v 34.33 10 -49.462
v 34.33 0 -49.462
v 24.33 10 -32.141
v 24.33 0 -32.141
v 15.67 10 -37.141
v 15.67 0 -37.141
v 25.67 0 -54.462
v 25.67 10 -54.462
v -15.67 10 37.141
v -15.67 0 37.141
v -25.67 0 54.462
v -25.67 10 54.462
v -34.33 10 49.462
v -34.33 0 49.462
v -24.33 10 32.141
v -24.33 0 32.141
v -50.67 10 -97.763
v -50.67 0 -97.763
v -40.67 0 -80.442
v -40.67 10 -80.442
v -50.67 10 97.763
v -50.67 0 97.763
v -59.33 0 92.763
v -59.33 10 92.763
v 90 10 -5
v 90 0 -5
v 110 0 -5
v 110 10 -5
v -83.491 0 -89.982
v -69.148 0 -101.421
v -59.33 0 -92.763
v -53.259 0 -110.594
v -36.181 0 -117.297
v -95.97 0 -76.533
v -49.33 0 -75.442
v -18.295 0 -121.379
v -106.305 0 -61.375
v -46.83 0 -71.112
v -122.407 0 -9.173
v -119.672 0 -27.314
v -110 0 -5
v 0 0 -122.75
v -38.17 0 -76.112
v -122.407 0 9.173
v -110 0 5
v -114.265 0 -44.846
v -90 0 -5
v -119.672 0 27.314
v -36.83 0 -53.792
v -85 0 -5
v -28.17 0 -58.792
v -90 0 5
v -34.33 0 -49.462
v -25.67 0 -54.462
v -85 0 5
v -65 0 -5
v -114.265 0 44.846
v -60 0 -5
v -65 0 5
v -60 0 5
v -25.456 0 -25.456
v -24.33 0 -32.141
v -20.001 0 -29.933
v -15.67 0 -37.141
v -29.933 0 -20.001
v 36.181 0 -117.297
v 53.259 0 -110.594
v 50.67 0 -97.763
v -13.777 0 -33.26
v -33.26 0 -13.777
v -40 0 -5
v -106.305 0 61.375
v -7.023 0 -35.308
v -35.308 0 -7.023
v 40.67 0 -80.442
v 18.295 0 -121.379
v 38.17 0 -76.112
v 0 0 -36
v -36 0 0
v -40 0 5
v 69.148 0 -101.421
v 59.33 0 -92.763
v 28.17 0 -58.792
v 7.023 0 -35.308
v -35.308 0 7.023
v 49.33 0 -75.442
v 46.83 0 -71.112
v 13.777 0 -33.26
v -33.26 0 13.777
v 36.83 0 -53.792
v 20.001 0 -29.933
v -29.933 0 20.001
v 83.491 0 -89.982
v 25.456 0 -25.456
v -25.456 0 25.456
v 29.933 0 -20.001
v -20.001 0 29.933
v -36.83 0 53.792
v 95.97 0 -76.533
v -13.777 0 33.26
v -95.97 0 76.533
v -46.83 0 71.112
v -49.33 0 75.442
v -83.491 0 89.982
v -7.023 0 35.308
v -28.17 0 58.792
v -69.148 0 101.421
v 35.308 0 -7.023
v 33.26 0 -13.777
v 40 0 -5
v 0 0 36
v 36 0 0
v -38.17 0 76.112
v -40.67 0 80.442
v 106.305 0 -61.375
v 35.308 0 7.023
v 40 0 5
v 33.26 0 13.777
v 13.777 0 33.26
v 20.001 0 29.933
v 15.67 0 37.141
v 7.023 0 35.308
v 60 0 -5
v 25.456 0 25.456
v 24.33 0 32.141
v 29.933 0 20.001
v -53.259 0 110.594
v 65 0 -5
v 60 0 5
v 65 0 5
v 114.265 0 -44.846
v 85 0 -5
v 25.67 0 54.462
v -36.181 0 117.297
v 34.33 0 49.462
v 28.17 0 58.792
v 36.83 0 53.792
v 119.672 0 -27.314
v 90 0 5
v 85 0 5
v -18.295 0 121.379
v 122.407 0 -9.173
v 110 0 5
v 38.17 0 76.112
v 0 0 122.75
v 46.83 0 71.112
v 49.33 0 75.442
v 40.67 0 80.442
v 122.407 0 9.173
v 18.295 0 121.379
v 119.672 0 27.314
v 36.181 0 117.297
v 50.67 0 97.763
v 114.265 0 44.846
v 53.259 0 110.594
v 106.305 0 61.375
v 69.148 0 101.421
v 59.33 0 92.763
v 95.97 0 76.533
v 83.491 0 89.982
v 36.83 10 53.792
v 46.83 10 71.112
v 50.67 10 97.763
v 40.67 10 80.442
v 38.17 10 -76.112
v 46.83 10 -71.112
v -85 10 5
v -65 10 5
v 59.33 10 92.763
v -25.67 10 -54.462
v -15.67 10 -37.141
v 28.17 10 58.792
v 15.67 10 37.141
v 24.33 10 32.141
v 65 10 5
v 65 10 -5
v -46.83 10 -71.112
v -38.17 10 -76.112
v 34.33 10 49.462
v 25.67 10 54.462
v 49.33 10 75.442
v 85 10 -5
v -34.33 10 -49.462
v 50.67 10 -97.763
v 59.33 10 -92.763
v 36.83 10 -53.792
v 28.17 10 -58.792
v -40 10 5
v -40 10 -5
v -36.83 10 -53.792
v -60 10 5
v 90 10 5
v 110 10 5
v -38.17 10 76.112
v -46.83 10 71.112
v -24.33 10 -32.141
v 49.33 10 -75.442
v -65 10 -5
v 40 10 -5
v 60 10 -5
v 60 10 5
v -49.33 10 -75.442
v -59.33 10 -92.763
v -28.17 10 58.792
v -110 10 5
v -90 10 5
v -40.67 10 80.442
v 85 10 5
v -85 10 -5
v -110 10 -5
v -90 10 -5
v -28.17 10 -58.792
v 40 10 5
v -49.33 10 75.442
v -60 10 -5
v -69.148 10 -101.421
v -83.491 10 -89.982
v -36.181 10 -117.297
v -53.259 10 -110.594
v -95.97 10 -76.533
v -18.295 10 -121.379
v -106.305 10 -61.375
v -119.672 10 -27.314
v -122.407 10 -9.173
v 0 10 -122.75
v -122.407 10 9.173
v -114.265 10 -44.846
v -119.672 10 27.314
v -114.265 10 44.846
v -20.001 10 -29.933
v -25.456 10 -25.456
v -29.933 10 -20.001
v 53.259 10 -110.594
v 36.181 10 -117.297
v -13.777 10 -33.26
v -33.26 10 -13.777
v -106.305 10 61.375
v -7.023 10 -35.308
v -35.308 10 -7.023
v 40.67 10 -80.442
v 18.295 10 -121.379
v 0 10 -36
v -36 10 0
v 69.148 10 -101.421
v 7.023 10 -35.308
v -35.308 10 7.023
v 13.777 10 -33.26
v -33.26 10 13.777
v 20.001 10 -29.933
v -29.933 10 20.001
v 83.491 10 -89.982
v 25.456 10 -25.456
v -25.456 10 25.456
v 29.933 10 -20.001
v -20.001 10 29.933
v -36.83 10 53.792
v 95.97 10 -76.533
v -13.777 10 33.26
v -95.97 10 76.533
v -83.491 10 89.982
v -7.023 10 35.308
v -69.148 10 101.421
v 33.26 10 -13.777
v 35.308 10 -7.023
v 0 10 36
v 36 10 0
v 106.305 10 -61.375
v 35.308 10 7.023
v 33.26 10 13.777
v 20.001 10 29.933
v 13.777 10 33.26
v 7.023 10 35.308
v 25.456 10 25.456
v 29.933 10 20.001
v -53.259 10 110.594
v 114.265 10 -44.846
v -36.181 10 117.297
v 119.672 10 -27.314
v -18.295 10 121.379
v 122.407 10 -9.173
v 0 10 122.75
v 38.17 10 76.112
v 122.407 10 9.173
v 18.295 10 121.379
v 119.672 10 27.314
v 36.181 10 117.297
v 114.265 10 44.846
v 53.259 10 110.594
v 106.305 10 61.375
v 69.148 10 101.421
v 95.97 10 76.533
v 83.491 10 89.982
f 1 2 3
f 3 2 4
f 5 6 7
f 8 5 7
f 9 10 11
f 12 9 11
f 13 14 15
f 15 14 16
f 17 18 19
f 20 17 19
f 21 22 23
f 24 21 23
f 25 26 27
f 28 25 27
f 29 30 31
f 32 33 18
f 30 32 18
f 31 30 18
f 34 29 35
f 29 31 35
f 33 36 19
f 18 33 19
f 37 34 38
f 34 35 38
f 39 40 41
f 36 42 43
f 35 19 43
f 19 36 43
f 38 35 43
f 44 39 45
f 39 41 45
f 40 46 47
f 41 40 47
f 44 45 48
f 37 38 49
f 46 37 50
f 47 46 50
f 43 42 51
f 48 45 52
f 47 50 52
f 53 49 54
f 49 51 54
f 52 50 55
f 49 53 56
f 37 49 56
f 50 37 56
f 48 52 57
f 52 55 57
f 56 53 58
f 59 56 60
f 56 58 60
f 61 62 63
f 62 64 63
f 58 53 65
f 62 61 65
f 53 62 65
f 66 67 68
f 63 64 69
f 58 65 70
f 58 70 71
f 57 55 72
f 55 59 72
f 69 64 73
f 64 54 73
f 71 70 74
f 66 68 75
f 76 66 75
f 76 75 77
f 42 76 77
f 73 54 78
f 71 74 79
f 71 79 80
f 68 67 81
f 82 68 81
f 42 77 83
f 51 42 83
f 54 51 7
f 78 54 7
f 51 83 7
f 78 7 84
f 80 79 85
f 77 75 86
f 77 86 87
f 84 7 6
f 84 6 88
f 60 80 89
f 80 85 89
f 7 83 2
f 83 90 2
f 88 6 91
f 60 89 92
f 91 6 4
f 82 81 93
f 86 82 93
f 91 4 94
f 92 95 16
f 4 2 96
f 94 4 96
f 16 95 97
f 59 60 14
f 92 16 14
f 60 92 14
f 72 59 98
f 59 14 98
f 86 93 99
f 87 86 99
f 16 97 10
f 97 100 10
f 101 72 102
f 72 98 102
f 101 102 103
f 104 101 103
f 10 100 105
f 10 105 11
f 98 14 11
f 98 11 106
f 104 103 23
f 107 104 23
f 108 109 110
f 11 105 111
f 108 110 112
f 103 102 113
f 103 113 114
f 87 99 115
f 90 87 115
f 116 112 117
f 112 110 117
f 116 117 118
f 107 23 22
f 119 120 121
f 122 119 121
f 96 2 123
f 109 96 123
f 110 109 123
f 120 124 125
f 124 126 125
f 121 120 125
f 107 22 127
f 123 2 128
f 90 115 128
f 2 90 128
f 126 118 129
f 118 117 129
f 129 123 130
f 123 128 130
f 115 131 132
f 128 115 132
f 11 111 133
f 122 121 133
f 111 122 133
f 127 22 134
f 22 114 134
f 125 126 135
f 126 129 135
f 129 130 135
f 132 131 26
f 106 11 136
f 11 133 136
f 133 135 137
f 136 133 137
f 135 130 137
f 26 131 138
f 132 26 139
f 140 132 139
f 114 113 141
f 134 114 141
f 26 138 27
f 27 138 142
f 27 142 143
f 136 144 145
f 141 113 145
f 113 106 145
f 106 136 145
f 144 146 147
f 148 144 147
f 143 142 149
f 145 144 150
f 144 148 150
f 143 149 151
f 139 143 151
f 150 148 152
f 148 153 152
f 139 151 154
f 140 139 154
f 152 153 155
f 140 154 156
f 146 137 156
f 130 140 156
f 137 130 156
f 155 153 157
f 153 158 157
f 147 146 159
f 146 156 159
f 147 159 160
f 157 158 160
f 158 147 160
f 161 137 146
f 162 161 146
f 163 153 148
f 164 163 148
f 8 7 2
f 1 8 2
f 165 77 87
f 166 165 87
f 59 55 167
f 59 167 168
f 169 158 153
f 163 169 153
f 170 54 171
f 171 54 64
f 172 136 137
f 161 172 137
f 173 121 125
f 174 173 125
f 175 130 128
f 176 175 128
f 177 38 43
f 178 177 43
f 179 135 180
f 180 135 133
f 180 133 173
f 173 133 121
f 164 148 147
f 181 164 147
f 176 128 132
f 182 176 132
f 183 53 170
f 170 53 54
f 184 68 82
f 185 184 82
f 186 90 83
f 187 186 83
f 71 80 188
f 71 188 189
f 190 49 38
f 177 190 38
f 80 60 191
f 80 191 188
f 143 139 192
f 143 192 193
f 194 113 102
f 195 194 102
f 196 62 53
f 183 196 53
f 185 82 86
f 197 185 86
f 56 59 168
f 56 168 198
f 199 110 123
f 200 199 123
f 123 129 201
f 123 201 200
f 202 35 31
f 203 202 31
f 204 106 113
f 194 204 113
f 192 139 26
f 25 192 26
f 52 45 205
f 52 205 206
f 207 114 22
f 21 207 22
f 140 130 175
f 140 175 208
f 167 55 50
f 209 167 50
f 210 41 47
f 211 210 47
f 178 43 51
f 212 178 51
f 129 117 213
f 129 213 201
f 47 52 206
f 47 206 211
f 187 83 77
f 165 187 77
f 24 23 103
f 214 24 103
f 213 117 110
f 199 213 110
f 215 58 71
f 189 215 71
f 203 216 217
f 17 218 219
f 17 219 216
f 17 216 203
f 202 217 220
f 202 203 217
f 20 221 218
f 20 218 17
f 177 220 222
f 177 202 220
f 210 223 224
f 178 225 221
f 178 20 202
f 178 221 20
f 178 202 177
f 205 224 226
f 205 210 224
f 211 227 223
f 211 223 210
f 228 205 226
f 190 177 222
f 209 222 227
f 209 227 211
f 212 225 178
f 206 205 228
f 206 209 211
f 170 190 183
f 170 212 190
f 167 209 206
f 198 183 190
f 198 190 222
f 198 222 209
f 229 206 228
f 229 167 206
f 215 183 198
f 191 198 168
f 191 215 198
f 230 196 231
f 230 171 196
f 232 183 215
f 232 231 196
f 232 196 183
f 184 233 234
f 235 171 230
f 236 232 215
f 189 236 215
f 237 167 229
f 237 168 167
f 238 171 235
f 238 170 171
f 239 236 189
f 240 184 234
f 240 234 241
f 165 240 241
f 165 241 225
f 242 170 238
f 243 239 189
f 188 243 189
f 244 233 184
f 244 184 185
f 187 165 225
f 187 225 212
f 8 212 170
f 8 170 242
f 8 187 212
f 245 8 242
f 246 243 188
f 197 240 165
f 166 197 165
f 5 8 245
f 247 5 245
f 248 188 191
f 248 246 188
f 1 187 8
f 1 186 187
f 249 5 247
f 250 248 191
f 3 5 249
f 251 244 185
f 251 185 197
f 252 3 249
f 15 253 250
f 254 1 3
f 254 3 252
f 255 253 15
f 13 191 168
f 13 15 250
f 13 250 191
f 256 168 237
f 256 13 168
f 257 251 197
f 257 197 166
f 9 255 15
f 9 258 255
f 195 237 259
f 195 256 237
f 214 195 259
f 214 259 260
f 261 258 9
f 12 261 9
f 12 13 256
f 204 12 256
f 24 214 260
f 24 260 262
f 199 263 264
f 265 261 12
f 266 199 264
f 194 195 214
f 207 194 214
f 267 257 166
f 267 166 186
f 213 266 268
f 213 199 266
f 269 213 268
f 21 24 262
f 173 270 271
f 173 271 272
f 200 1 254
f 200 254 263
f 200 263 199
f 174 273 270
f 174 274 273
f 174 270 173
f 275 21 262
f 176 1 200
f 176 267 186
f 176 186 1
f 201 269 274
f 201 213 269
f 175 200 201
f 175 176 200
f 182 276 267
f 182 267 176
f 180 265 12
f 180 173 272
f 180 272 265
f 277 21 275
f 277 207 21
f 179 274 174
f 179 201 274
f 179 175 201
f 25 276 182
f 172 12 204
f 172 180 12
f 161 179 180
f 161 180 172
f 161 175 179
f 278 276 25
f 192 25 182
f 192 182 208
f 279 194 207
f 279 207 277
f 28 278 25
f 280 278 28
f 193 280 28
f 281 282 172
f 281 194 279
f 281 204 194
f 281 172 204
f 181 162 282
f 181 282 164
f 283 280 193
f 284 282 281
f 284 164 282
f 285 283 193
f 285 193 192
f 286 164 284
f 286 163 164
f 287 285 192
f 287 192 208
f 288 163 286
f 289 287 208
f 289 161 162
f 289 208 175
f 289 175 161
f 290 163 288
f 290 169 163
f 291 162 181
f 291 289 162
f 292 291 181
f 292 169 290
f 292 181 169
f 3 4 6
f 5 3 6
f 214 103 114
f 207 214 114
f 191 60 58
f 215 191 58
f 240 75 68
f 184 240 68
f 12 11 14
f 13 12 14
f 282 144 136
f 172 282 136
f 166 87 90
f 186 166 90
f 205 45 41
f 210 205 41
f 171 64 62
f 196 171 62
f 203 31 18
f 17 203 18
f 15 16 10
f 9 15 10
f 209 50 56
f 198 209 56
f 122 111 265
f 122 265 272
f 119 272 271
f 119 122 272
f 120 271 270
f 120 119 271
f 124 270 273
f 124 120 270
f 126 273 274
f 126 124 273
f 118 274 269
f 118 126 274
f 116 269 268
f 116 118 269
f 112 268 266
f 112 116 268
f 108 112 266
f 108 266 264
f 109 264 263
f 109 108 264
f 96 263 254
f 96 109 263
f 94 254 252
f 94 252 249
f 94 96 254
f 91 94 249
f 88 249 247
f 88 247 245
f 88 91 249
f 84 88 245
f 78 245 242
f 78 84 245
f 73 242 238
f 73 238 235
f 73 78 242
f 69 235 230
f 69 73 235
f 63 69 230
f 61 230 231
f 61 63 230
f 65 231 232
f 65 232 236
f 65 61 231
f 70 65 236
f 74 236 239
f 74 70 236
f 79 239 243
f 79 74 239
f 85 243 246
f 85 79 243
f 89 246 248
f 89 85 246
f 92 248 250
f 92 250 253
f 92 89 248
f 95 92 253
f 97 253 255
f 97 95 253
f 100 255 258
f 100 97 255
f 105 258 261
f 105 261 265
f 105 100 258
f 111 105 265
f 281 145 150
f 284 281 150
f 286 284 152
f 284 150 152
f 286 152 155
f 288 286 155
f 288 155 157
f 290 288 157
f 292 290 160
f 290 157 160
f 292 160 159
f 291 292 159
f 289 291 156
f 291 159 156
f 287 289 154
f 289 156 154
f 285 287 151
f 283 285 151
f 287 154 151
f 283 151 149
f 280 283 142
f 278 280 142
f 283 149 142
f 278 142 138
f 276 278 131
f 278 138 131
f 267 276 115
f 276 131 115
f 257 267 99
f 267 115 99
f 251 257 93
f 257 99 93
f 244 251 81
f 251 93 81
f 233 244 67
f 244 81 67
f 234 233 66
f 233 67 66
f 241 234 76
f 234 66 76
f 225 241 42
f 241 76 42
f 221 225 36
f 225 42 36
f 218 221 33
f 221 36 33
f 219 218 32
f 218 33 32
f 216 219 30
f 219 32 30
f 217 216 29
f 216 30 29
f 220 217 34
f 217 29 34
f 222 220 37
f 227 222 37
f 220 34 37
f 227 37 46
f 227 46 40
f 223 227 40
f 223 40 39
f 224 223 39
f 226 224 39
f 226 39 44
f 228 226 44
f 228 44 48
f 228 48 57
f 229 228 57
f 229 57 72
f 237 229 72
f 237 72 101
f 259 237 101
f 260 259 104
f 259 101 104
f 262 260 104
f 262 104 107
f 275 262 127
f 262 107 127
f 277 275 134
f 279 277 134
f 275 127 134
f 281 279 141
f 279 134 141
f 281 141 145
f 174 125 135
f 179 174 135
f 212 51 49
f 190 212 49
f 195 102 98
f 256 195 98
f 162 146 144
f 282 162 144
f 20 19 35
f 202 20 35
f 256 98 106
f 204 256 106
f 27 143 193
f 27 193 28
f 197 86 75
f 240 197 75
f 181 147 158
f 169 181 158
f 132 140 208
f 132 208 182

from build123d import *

# Parameters (mm, degrees)
SKETCH1_R           = 122.75
SKETCH1_R_2         = 36
SKETCH1_W           = 20
SKETCH1_H           = 10
BOSS_EXTRUDE1_DEPTH = 10


with BuildPart() as part:
    # Sketch1 → Boss-Extrude1 (new body)
    with BuildSketch(Plane(origin=(0, 0, 0), x_dir=(1, 0, 0), z_dir=(0, 1, 0))):
        Circle(SKETCH1_R)
        Circle(SKETCH1_R_2, mode=Mode.SUBTRACT)
        with Locations((75, 0)):
            Rectangle(SKETCH1_W, SKETCH1_H, mode=Mode.SUBTRACT)
        with Locations((50, 0)):
            Rectangle(SKETCH1_W, SKETCH1_H, mode=Mode.SUBTRACT)
        with Locations((100, 0)):
            Rectangle(SKETCH1_W, SKETCH1_H, mode=Mode.SUBTRACT)
        Polygon((15.669872981, -37.141016151), (24.330127019, -32.141016151), (34.330127019, -49.461524227), (25.669872981, -54.461524227), align=None, mode=Mode.SUBTRACT)
        Polygon((28.169872981, -58.791651246), (36.830127019, -53.791651246), (46.830127019, -71.112159322), (38.169872981, -76.112159322), align=None, mode=Mode.SUBTRACT)
        Polygon((40.669872981, -80.442286341), (49.330127019, -75.442286341), (59.330127019, -92.762794416), (50.669872981, -97.762794416), align=None, mode=Mode.SUBTRACT)
        Polygon((-24.330127019, -32.141016151), (-15.669872981, -37.141016151), (-25.669872981, -54.461524227), (-34.330127019, -49.461524227), align=None, mode=Mode.SUBTRACT)
        Polygon((-36.830127019, -53.791651246), (-28.169872981, -58.791651246), (-38.169872981, -76.112159322), (-46.830127019, -71.112159322), align=None, mode=Mode.SUBTRACT)
        Polygon((-49.330127019, -75.442286341), (-40.669872981, -80.442286341), (-50.669872981, -97.762794416), (-59.330127019, -92.762794416), align=None, mode=Mode.SUBTRACT)
        with Locations((-50, 0)):
            Rectangle(SKETCH1_W, SKETCH1_H, mode=Mode.SUBTRACT)
        with Locations((-75, 0)):
            Rectangle(SKETCH1_W, SKETCH1_H, mode=Mode.SUBTRACT)
        with Locations((-100, 0)):
            Rectangle(SKETCH1_W, SKETCH1_H, mode=Mode.SUBTRACT)
        Polygon((-15.669872981, 37.141016151), (-24.330127019, 32.141016151), (-34.330127019, 49.461524227), (-25.669872981, 54.461524227), align=None, mode=Mode.SUBTRACT)
        Polygon((-28.169872981, 58.791651246), (-36.830127019, 53.791651246), (-46.830127019, 71.112159322), (-38.169872981, 76.112159322), align=None, mode=Mode.SUBTRACT)
        Polygon((-40.669872981, 80.442286341), (-49.330127019, 75.442286341), (-59.330127019, 92.762794416), (-50.669872981, 97.762794416), align=None, mode=Mode.SUBTRACT)
        Polygon((24.330127019, 32.141016151), (15.669872981, 37.141016151), (25.669872981, 54.461524227), (34.330127019, 49.461524227), align=None, mode=Mode.SUBTRACT)
        Polygon((36.830127019, 53.791651246), (28.169872981, 58.791651246), (38.169872981, 76.112159322), (46.830127019, 71.112159322), align=None, mode=Mode.SUBTRACT)
        Polygon((49.330127019, 75.442286341), (40.669872981, 80.442286341), (50.669872981, 97.762794416), (59.330127019, 92.762794416), align=None, mode=Mode.SUBTRACT)
    extrude(amount=BOSS_EXTRUDE1_DEPTH)


solid = part.part
